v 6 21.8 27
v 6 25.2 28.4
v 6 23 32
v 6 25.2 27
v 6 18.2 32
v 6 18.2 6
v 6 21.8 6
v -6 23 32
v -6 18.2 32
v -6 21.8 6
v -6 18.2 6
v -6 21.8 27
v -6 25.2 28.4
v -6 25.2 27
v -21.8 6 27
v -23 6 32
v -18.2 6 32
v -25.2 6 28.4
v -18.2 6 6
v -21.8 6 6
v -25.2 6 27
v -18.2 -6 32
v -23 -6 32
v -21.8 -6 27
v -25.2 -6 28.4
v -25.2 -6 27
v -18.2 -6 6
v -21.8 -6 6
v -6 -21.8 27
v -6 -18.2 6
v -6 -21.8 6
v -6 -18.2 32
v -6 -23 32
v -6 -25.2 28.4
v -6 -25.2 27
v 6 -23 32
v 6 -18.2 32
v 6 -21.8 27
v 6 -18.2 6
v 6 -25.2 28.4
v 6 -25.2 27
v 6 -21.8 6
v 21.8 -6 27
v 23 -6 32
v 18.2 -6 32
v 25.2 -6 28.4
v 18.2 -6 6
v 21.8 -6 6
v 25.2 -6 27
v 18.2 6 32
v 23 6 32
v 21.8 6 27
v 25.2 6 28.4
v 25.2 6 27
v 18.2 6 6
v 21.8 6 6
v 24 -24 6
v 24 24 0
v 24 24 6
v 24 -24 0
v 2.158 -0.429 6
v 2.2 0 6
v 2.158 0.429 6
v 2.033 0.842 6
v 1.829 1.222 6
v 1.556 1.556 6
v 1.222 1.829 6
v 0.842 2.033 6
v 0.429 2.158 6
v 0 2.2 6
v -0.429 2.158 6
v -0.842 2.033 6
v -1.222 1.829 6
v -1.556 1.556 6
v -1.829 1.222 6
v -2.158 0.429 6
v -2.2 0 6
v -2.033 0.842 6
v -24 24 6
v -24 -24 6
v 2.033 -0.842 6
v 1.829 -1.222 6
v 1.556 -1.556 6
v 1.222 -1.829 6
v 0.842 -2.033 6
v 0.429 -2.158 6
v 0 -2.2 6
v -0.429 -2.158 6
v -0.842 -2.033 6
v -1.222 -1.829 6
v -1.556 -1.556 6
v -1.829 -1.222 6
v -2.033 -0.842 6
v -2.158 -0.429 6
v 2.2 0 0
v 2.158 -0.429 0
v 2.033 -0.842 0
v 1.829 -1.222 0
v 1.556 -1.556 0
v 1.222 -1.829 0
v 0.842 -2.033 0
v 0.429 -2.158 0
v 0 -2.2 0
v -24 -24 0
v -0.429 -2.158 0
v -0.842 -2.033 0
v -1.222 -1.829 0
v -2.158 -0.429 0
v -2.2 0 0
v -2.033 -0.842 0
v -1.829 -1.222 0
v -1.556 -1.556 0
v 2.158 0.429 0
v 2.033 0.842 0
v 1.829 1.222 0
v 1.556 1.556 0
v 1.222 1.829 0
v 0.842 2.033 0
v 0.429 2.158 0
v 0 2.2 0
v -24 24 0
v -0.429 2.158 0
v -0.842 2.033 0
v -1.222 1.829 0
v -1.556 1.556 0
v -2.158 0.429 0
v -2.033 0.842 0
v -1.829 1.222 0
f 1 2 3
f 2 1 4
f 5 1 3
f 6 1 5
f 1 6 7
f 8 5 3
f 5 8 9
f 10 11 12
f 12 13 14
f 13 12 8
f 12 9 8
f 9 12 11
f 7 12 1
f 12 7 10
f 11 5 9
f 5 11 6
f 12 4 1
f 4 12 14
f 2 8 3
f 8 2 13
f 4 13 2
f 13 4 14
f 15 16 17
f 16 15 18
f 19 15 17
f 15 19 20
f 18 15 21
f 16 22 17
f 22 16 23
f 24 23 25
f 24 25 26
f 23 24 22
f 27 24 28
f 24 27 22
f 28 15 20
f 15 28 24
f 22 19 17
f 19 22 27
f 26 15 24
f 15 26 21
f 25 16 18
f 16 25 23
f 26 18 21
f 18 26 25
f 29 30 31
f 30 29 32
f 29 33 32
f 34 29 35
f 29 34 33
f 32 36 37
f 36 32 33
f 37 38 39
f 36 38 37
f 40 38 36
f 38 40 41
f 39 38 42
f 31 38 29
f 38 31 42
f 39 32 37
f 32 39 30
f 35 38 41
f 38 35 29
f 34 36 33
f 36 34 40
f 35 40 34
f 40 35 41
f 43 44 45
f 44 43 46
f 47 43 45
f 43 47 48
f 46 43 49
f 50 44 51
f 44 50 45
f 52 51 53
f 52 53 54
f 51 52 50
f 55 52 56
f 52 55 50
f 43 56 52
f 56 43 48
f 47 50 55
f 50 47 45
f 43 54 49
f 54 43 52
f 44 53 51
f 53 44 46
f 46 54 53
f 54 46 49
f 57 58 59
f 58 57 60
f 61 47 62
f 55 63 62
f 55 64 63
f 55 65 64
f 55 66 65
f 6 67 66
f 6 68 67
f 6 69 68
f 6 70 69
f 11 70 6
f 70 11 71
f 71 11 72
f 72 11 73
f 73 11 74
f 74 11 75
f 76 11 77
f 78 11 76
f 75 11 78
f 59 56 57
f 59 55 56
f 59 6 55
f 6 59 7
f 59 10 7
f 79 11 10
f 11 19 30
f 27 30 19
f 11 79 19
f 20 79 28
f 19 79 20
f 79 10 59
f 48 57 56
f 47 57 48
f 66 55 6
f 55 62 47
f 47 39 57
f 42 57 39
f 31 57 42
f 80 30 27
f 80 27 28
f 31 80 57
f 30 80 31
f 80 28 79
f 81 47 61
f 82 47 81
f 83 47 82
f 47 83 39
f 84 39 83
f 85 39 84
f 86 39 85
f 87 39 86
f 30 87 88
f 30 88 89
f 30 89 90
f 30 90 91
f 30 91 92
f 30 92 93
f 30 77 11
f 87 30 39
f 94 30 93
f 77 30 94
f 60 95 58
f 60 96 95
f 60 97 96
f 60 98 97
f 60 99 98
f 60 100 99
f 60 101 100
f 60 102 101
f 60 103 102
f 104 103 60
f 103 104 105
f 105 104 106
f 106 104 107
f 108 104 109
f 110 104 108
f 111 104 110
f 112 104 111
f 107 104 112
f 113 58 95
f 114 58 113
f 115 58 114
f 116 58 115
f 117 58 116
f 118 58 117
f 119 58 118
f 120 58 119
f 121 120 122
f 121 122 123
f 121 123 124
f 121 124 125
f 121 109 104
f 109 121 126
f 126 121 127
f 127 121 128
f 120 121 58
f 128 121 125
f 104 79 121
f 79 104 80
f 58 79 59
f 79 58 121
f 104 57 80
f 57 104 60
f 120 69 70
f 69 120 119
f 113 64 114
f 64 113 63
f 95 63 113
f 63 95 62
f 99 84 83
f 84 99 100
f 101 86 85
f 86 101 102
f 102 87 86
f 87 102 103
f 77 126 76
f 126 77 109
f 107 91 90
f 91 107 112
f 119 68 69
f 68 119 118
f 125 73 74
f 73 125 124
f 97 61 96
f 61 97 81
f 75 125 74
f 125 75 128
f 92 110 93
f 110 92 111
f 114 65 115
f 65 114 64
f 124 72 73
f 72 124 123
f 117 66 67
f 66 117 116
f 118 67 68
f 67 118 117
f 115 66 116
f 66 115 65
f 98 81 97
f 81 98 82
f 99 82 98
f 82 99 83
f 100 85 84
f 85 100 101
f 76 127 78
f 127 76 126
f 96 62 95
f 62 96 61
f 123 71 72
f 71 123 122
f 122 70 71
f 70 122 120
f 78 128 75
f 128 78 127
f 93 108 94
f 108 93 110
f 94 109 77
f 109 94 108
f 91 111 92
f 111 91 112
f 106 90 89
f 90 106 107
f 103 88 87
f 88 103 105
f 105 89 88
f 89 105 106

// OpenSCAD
$fn = 32;

// ----------------------------------------------------------------------
// Snap-fit latch: 4 arms, 26 mm tall, 3.6 mm undercut hooks
// ----------------------------------------------------------------------

// --- parameters (mm) ---
base_d = 48;              // base plate depth
base_h = 6;               // base plate thickness
span = 40;                // distance between opposite arms
arm_t = 3.6;              // arm thickness
arm_d = 12;               // arm width
height = 26;              // free arm length
head_len = 3.6;           // hook reach
head_h = 5;               // hook height
lead = 1.4;               // lead-in ramp thickness
bore_d = 4.4;             // base fixing bore
top_z = 32;               // height of the arm tips above the base

arms = 4;

difference() {
  union() {
    /* base plate, centred on the arm ring */
    translate([-24, -24, 0]) cube([base_d, base_d, base_h]);
    for (a = [0 : 360 / arms : 359]) rotate([0, 0, a]) {
    /* arm, sunk 0.5 mm into the base */
    translate([-arm_d / 2, span / 2 - arm_t / 2, base_h - 0.5]) cube([arm_d, arm_t, height + 0.5]);
    /* hook: a convex hull of a tall inner block and a thin outer lip
       gives a flat undercut below and a lead-in ramp on top */
    hull() {
      translate([-arm_d / 2, span / 2 + arm_t / 2 - 0.6, top_z - head_h]) cube([arm_d, lead + 0.4, head_h]);
      translate([-arm_d / 2, span / 2 + arm_t / 2 - 0.2, top_z - head_h]) cube([arm_d, head_len, lead]);
    }
    }
  }
  translate([0, 0, -2.5]) cylinder(h = base_h + 5, d = bore_d);
}
